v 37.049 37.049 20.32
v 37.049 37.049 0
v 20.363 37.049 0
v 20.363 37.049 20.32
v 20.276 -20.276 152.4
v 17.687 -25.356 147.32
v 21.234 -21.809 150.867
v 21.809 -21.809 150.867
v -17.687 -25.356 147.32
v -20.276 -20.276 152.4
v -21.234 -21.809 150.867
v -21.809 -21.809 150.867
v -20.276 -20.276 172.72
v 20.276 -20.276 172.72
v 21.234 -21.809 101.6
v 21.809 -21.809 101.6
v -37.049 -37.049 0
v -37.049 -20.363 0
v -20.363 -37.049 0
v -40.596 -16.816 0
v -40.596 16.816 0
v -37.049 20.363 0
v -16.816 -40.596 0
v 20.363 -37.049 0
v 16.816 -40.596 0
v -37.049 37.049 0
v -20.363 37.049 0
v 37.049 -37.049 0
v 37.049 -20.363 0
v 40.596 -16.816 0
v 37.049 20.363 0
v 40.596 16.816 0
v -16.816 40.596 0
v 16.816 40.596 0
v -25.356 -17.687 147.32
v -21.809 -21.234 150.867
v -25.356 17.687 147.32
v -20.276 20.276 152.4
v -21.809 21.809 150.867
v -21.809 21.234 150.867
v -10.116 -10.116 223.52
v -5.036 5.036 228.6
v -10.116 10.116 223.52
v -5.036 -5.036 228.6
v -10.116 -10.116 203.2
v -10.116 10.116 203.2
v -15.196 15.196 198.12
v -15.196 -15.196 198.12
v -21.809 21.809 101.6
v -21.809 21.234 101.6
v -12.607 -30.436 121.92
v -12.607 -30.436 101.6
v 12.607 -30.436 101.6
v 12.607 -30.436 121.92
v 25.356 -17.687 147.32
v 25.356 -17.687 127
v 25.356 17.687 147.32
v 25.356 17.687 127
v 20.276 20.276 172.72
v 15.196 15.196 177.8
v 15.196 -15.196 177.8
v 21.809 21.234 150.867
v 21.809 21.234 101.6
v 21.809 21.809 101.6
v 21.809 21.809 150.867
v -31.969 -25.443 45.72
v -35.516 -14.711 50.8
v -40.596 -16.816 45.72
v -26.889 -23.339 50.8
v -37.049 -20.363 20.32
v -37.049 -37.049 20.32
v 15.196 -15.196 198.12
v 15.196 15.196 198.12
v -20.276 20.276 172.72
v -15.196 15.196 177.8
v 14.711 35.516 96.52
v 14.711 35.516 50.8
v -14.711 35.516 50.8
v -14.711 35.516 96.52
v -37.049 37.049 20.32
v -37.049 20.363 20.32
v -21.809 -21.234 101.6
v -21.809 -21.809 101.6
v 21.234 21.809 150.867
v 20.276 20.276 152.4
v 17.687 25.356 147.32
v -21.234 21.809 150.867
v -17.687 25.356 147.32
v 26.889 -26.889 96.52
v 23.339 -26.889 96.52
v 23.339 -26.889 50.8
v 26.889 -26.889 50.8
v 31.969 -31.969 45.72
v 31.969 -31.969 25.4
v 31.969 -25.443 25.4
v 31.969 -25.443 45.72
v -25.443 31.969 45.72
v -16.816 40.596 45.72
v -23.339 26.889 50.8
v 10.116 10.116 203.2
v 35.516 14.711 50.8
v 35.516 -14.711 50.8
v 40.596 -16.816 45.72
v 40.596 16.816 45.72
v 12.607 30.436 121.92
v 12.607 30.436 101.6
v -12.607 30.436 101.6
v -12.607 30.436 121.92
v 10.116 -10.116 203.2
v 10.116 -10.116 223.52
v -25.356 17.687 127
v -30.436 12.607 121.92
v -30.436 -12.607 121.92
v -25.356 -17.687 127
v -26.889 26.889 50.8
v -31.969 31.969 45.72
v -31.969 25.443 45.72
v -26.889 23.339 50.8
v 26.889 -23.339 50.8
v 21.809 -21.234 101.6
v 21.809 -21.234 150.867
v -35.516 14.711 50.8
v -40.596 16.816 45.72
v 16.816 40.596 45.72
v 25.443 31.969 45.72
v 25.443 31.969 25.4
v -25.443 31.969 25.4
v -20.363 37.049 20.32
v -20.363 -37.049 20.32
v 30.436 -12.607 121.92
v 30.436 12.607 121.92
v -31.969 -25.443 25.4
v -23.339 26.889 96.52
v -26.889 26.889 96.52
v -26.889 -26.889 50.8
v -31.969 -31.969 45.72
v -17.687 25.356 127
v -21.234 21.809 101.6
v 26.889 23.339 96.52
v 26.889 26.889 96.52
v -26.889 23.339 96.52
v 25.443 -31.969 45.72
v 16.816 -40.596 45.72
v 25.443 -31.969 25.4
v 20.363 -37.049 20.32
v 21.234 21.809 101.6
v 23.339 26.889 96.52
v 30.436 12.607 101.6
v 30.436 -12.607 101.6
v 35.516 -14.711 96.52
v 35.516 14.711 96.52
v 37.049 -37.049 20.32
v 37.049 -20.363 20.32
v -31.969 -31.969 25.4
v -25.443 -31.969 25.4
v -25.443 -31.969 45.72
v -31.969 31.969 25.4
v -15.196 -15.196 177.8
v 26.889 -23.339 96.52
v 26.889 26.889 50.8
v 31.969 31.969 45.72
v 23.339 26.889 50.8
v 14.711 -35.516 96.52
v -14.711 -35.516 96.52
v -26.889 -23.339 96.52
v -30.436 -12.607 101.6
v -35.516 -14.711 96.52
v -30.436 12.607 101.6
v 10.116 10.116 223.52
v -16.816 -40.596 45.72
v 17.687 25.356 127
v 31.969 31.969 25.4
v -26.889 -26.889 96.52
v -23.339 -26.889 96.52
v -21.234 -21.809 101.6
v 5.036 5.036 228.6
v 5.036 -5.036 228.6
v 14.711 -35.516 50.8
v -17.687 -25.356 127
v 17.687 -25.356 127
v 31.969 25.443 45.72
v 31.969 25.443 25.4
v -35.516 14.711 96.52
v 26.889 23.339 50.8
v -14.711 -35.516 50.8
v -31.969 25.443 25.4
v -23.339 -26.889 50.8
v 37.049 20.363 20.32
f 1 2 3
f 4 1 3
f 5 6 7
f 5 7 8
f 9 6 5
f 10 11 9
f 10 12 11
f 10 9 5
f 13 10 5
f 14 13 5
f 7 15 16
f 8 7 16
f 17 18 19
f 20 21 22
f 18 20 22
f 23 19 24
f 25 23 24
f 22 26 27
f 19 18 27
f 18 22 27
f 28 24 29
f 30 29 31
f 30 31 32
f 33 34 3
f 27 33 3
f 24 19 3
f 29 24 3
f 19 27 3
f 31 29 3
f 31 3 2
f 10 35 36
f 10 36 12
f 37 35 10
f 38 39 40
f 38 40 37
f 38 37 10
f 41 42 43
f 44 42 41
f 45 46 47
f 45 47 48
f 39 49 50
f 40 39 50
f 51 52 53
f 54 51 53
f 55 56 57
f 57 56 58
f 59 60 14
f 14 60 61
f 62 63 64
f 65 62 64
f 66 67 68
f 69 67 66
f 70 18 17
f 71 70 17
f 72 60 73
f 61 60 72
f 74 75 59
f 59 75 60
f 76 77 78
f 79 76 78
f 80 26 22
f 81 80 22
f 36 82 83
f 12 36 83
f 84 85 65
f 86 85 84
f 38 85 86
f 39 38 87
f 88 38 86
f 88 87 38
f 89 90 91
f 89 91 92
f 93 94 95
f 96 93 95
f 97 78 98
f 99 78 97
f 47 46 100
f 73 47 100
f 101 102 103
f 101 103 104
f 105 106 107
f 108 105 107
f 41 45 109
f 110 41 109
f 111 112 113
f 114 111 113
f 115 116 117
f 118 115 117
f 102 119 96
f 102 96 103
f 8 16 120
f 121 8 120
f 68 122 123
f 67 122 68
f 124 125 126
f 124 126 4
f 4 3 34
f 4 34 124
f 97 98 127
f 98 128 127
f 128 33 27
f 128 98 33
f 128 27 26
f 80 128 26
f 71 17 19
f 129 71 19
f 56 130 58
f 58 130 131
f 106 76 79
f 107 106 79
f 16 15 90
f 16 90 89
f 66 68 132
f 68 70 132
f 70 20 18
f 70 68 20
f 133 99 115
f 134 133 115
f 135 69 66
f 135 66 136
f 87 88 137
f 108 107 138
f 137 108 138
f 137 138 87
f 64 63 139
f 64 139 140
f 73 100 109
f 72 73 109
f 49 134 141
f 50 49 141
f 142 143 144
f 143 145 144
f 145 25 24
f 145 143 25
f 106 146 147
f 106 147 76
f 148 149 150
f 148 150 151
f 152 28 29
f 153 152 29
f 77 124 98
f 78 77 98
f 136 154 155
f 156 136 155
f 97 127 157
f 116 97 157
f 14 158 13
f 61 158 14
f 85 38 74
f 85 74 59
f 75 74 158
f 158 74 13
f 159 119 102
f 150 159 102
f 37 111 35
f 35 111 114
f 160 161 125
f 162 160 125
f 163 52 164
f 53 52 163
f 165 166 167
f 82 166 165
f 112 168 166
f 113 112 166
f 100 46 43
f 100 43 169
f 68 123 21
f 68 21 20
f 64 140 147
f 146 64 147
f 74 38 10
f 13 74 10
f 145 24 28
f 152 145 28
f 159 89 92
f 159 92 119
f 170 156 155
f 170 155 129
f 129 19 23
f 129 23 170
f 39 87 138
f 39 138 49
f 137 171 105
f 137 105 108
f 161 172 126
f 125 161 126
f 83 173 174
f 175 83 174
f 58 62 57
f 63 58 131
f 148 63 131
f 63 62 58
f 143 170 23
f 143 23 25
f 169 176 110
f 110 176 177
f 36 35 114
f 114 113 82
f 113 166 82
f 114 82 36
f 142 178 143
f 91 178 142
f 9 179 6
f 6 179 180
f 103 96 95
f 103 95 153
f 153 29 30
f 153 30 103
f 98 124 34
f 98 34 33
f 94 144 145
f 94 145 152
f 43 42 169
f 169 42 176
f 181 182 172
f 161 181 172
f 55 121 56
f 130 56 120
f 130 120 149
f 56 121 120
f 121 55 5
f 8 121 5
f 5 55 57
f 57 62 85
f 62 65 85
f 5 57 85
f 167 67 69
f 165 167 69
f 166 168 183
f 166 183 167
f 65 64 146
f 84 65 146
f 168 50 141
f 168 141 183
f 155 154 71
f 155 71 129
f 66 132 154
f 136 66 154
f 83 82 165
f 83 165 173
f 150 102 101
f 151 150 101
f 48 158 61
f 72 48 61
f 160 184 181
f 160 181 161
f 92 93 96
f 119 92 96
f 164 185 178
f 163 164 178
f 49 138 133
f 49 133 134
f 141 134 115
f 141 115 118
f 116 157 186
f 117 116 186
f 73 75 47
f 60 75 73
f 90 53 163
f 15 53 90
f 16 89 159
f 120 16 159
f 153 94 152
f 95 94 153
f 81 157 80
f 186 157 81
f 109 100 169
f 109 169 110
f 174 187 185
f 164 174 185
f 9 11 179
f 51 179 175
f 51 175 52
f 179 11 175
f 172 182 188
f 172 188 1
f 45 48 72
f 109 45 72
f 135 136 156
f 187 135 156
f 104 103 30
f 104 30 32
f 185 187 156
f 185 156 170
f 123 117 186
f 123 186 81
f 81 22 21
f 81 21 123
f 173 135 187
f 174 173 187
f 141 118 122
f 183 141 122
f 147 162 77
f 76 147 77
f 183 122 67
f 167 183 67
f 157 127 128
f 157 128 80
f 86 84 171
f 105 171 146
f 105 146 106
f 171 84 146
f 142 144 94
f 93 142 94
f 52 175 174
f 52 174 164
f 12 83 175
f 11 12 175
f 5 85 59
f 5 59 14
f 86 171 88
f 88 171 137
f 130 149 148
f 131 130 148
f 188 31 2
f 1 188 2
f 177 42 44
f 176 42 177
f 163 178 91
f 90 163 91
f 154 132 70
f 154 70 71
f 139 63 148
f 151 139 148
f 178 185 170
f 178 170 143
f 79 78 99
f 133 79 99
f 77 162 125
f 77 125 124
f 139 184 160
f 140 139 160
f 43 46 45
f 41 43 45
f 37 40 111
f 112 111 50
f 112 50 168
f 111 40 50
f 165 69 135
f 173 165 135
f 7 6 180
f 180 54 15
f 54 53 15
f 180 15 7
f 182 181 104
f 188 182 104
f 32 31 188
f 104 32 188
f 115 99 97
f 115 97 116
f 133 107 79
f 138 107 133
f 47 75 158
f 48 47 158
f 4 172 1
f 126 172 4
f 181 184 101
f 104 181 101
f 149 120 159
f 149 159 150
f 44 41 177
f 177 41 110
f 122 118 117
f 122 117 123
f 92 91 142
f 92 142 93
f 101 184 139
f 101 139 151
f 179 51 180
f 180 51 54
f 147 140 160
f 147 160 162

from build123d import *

# Parameters (mm, degrees)
F1_DEPTH     = 25.4
F2_SIZE      = 5.08
F3_DEPTH     = 25.4
F4_SIZE      = 5.08
F5_DEPTH     = 25.4
F6_DEPTH     = 25.4
F7_SIZE      = 5.08
F8_DEPTH     = 25.4
F9_SIZE      = 5.08
F10_DEPTH    = 25.4
F11_T1_DEPTH = 61.5024806542
F11_T3_DEPTH = 61.5024806542
F12_DEPTH    = 25.4
F13_SIZE     = 5.08
F14_DEPTH    = 25.4
F15_SIZE     = 5.08
F16_DEPTH    = 25.4
F17_SIZE     = 5.08


# Not quite as in the source:
# - a fillet or chamfer that OpenCascade refuses, or shapes differently, is made with other operations: its cross-section is extruded or revolved along the edge and cut away or added


with BuildPart() as f1:
    # F0 (on Top) → F1 (new body)
    with BuildSketch(Plane.XY):
        Polygon((37.0489656925, 20.3627443159), (37.0489656925, 37.0489656925), (20.3627443159, 37.0489656925), align=None)
        Polygon((40.5962094665, 16.8155005419), (37.0489656925, 20.3627443159), (37.0489656925, -20.3627443159), (40.5962094665, -16.8155005419), align=None)
        Polygon((37.0489656925, -20.3627443159), (37.0489656925, 20.3627443159), (20.3627443159, 37.0489656925), (-20.3627443159, 37.0489656925), (-37.0489656925, 20.3627443159), (-37.0489656925, -20.3627443159), (-20.3627443159, -37.0489656925), (20.3627443159, -37.0489656925), align=None)
        Polygon((-20.3627443159, 37.0489656925), (20.3627443159, 37.0489656925), (16.8155005419, 40.5962094665), (-16.8155005419, 40.5962094665), align=None)
        Polygon((37.0489656925, -37.0489656925), (37.0489656925, -20.3627443159), (20.3627443159, -37.0489656925), align=None)
        Polygon((-37.0489656925, 20.3627443159), (-20.3627443159, 37.0489656925), (-37.0489656925, 37.0489656925), align=None)
        Polygon((16.8155005419, -40.5962094665), (20.3627443159, -37.0489656925), (-20.3627443159, -37.0489656925), (-16.8155005419, -40.5962094665), align=None)
        Polygon((-37.0489656925, -20.3627443159), (-37.0489656925, 20.3627443159), (-40.5962094665, 16.8155005419), (-40.5962094665, -16.8155005419), align=None)
        Polygon((-37.0489656925, -37.0489656925), (-20.3627443159, -37.0489656925), (-37.0489656925, -20.3627443159), align=None)
    extrude(amount=F1_DEPTH)

    # F2
    f2_edges = [f1.edges().sort_by_distance(p)[0] for p in [
        (-28.705855, 37.048966, 25.4),
        (-37.048966, 28.705855, 25.4),
        (28.705855, 37.048966, 25.4),
        (37.048966, 28.705855, 25.4),
        (37.048966, -28.705855, 25.4),
        (28.705855, -37.048966, 25.4),
        (-28.705855, -37.048966, 25.4),
        (-37.048966, -28.705855, 25.4),
    ]]
    chamfer(f2_edges, length=F2_SIZE)

    # F3 (add): a face of the model
    f3_faces = [f1.faces().sort_by_distance(p)[0] for p in [
        (0, 0, 25.4),
    ]]
    extrude(f3_faces, amount=F3_DEPTH)

    # F4
    f4_edges = [f1.edges().sort_by_distance(p)[0] for p in [
        (-21.129122, 36.282588, 50.8),
        (-28.705855, 31.968966, 50.8),
        (-31.968966, 28.705855, 50.8),
        (-36.282588, 21.129122, 50.8),
        (-40.596209, 0, 50.8),
        (-36.282588, -21.129122, 50.8),
        (-31.968966, -28.705855, 50.8),
        (-28.705855, -31.968966, 50.8),
        (-21.129122, -36.282588, 50.8),
        (0, -40.596209, 50.8),
        (21.129122, -36.282588, 50.8),
        (28.705855, -31.968966, 50.8),
        (31.968966, -28.705855, 50.8),
        (36.282588, -21.129122, 50.8),
        (40.596209, 0, 50.8),
        (36.282588, 21.129122, 50.8),
        (31.968966, 28.705855, 50.8),
        (28.705855, 31.968966, 50.8),
        (21.129122, 36.282588, 50.8),
        (0, 40.596209, 50.8),
    ]]
    chamfer(f4_edges, length=F4_SIZE)

    # F5 (add): a face of the model
    f5_faces = [f1.faces().sort_by_distance(p)[0] for p in [
        (0, 0, 50.8),
    ]]
    extrude(f5_faces, amount=F5_DEPTH)

    # F6 (add): a face of the model
    f6_faces = [f1.faces().sort_by_distance(p)[0] for p in [
        (0, 0, 76.2),
    ]]
    extrude(f6_faces, amount=F6_DEPTH)

    # F7
    f7_edges = [f1.edges().sort_by_distance(p)[0] for p in [
        (-19.024918, 31.202588, 101.6),
        (-25.113753, 26.888966, 101.6),
        (0, 35.516209, 101.6),
        (-26.888966, 25.113753, 101.6),
        (19.024918, 31.202588, 101.6),
        (-31.202588, 19.024918, 101.6),
        (25.113753, 26.888966, 101.6),
        (-35.516209, 0, 101.6),
        (26.888966, 25.113753, 101.6),
        (-31.202588, -19.024918, 101.6),
        (31.202588, 19.024918, 101.6),
        (-26.888966, -25.113753, 101.6),
        (35.516209, 0, 101.6),
        (-25.113753, -26.888966, 101.6),
        (31.202588, -19.024918, 101.6),
        (-19.024918, -31.202588, 101.6),
        (26.888966, -25.113753, 101.6),
        (0, -35.516209, 101.6),
        (25.113753, -26.888966, 101.6),
        (19.024918, -31.202588, 101.6),
    ]]
    chamfer(f7_edges, length=F7_SIZE)

    # F8 (add): a face of the model
    f8_faces = [f1.faces().sort_by_distance(p)[0] for p in [
        (0, 0, 101.6),
    ]]
    extrude(f8_faces, amount=F8_DEPTH)

    # F9
    f9_edges = [f1.edges().sort_by_distance(p)[0] for p in [
        (0, 30.436209, 127),
        (-30.436209, 0, 127),
        (30.436209, 0, 127),
        (0, -30.436209, 127),
    ]]
    chamfer(f9_edges, length=F9_SIZE)

    # F10 (add): a face of the model
    f10_faces = [f1.faces().sort_by_distance(p)[0] for p in [
        (0, 0, 127),
    ]]
    extrude(f10_faces, amount=F10_DEPTH)

    # F11: chamfer of 5.08 on 4 edges, made by hand

    # F11_s2 → F11_t1 (cut)
    with BuildSketch(Plane.XZ.offset(-30.7512403271)):
        Polygon((-25.3562094665, 147.32), (-20.2762094665, 152.4), (-25.3562094665, 152.4), align=None)
        Polygon((25.3562094665, 147.32), (20.2762094665, 152.4), (25.3562094665, 152.4), align=None)
    extrude(amount=F11_T1_DEPTH, mode=Mode.SUBTRACT)

    # F11_s4 → F11_t3 (cut)
    with BuildSketch(Plane.YZ.offset(-30.7512403271)):
        Polygon((-25.3562094665, 147.32), (-20.2762094665, 152.4), (-25.3562094665, 152.4), align=None)
        Polygon((20.2762094665, 152.4), (25.3562094665, 147.32), (25.3562094665, 152.4), align=None)
    extrude(amount=F11_T3_DEPTH, mode=Mode.SUBTRACT)

    # F12 (add): a face of the model
    f12_faces = [f1.faces().sort_by_distance(p)[0] for p in [
        (0, 0, 152.4),
    ]]
    extrude(f12_faces, amount=F12_DEPTH)

    # F13
    f13_edges = [f1.edges().sort_by_distance(p)[0] for p in [
        (0, 20.276209, 177.8),
        (20.276209, 0, 177.8),
        (0, -20.276209, 177.8),
        (-20.276209, 0, 177.8),
    ]]
    chamfer(f13_edges, length=F13_SIZE)

    # F14 (add): a face of the model
    f14_faces = [f1.faces().sort_by_distance(p)[0] for p in [
        (0, 0, 177.8),
    ]]
    extrude(f14_faces, amount=F14_DEPTH)

    # F15
    f15_edges = [f1.edges().sort_by_distance(p)[0] for p in [
        (0, 15.196209, 203.2),
        (-15.196209, 0, 203.2),
        (15.196209, 0, 203.2),
        (0, -15.196209, 203.2),
    ]]
    chamfer(f15_edges, length=F15_SIZE)

    # F16 (add): a face of the model
    f16_faces = [f1.faces().sort_by_distance(p)[0] for p in [
        (0, 0, 203.2),
    ]]
    extrude(f16_faces, amount=F16_DEPTH)

    # F17
    f17_edges = [f1.edges().sort_by_distance(p)[0] for p in [
        (0, 10.116209, 228.6),
        (-10.116209, 0, 228.6),
        (10.116209, 0, 228.6),
        (0, -10.116209, 228.6),
    ]]
    chamfer(f17_edges, length=F17_SIZE)


solid = f1.part
